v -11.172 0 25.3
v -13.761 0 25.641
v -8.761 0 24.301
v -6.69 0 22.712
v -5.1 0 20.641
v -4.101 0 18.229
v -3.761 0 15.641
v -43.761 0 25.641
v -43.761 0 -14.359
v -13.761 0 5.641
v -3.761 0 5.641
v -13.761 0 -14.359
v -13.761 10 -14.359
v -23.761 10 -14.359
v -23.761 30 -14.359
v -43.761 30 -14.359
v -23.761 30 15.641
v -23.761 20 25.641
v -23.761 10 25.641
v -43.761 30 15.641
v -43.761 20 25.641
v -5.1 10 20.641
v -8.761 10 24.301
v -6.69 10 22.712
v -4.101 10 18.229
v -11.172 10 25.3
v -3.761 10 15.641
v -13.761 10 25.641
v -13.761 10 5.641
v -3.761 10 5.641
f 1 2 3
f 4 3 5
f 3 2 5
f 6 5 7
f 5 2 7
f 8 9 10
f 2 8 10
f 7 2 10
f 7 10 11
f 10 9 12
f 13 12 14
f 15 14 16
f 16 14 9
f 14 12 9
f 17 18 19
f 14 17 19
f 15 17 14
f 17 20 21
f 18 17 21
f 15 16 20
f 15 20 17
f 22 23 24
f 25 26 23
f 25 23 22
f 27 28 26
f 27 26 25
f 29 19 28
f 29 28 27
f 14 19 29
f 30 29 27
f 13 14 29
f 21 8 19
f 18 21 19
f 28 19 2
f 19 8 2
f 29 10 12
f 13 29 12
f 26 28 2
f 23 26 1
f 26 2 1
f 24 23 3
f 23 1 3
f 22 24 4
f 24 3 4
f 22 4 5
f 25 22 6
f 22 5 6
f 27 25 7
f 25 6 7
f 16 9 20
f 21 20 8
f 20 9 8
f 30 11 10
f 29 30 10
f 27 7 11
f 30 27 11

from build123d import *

# Parameters (mm, degrees)
BOSS_EXTRUDE1_DEPTH = 30
SKETCH3_OUTSIDE_W   = 54.806
SKETCH3_OUTSIDE_H   = 54.806
SKETCH3_OUTSIDE_W_2 = 20
SKETCH3_OUTSIDE_H_2 = 40
CUT_EXTRUDE1_DEPTH  = 20
CUT_EXTRUDE2_DEPTH  = 20


with BuildPart() as part:
    # Sketch2 → Boss-Extrude1 (new body)
    with BuildSketch(Plane(origin=(0, 0, 0), x_dir=(1, 0, 0), z_dir=(0, 1, 0))):
        with BuildLine():
            Line((-43.760683761, 14.358974359), (-43.760683761, -25.641025641))
            Line((-43.760683761, -25.641025641), (-13.760683761, -25.641025641))
            ThreePointArc((-13.760683761, -25.641025641), (-6.689615949, -22.712093453), (-3.760683761, -15.641025641))
            Line((-3.760683761, -15.641025641), (-3.760683761, -5.641025641))
            Line((-3.760683761, -5.641025641), (-13.760683761, -5.641025641))
            Line((-13.760683761, -5.641025641), (-13.760683761, 14.358974359))
            Line((-13.760683761, 14.358974359), (-43.760683761, 14.358974359))
        make_face()
    extrude(amount=BOSS_EXTRUDE1_DEPTH)

    # Sketch3 outside → Cut-Extrude1 (cut)
    with BuildSketch(Plane(origin=(0, 30, 0), x_dir=(1, 0, 0), z_dir=(0, 1, 0))):
        with Locations((-23.761, -5.641)):
            Rectangle(SKETCH3_OUTSIDE_W, SKETCH3_OUTSIDE_H)
        with Locations((-33.760683761, -5.641025641)):
            Rectangle(SKETCH3_OUTSIDE_W_2, SKETCH3_OUTSIDE_H_2, mode=Mode.SUBTRACT)
    extrude(amount=-CUT_EXTRUDE1_DEPTH, mode=Mode.SUBTRACT)

    # Sketch4 → Cut-Extrude2 (cut)
    with BuildSketch(Plane.ZY.offset(43.760683761)):
        Polygon((15.641025641, 30), (25.641025641, 20), (25.641025641, 30), align=None)
    extrude(amount=-CUT_EXTRUDE2_DEPTH, mode=Mode.SUBTRACT)


solid = part.part
